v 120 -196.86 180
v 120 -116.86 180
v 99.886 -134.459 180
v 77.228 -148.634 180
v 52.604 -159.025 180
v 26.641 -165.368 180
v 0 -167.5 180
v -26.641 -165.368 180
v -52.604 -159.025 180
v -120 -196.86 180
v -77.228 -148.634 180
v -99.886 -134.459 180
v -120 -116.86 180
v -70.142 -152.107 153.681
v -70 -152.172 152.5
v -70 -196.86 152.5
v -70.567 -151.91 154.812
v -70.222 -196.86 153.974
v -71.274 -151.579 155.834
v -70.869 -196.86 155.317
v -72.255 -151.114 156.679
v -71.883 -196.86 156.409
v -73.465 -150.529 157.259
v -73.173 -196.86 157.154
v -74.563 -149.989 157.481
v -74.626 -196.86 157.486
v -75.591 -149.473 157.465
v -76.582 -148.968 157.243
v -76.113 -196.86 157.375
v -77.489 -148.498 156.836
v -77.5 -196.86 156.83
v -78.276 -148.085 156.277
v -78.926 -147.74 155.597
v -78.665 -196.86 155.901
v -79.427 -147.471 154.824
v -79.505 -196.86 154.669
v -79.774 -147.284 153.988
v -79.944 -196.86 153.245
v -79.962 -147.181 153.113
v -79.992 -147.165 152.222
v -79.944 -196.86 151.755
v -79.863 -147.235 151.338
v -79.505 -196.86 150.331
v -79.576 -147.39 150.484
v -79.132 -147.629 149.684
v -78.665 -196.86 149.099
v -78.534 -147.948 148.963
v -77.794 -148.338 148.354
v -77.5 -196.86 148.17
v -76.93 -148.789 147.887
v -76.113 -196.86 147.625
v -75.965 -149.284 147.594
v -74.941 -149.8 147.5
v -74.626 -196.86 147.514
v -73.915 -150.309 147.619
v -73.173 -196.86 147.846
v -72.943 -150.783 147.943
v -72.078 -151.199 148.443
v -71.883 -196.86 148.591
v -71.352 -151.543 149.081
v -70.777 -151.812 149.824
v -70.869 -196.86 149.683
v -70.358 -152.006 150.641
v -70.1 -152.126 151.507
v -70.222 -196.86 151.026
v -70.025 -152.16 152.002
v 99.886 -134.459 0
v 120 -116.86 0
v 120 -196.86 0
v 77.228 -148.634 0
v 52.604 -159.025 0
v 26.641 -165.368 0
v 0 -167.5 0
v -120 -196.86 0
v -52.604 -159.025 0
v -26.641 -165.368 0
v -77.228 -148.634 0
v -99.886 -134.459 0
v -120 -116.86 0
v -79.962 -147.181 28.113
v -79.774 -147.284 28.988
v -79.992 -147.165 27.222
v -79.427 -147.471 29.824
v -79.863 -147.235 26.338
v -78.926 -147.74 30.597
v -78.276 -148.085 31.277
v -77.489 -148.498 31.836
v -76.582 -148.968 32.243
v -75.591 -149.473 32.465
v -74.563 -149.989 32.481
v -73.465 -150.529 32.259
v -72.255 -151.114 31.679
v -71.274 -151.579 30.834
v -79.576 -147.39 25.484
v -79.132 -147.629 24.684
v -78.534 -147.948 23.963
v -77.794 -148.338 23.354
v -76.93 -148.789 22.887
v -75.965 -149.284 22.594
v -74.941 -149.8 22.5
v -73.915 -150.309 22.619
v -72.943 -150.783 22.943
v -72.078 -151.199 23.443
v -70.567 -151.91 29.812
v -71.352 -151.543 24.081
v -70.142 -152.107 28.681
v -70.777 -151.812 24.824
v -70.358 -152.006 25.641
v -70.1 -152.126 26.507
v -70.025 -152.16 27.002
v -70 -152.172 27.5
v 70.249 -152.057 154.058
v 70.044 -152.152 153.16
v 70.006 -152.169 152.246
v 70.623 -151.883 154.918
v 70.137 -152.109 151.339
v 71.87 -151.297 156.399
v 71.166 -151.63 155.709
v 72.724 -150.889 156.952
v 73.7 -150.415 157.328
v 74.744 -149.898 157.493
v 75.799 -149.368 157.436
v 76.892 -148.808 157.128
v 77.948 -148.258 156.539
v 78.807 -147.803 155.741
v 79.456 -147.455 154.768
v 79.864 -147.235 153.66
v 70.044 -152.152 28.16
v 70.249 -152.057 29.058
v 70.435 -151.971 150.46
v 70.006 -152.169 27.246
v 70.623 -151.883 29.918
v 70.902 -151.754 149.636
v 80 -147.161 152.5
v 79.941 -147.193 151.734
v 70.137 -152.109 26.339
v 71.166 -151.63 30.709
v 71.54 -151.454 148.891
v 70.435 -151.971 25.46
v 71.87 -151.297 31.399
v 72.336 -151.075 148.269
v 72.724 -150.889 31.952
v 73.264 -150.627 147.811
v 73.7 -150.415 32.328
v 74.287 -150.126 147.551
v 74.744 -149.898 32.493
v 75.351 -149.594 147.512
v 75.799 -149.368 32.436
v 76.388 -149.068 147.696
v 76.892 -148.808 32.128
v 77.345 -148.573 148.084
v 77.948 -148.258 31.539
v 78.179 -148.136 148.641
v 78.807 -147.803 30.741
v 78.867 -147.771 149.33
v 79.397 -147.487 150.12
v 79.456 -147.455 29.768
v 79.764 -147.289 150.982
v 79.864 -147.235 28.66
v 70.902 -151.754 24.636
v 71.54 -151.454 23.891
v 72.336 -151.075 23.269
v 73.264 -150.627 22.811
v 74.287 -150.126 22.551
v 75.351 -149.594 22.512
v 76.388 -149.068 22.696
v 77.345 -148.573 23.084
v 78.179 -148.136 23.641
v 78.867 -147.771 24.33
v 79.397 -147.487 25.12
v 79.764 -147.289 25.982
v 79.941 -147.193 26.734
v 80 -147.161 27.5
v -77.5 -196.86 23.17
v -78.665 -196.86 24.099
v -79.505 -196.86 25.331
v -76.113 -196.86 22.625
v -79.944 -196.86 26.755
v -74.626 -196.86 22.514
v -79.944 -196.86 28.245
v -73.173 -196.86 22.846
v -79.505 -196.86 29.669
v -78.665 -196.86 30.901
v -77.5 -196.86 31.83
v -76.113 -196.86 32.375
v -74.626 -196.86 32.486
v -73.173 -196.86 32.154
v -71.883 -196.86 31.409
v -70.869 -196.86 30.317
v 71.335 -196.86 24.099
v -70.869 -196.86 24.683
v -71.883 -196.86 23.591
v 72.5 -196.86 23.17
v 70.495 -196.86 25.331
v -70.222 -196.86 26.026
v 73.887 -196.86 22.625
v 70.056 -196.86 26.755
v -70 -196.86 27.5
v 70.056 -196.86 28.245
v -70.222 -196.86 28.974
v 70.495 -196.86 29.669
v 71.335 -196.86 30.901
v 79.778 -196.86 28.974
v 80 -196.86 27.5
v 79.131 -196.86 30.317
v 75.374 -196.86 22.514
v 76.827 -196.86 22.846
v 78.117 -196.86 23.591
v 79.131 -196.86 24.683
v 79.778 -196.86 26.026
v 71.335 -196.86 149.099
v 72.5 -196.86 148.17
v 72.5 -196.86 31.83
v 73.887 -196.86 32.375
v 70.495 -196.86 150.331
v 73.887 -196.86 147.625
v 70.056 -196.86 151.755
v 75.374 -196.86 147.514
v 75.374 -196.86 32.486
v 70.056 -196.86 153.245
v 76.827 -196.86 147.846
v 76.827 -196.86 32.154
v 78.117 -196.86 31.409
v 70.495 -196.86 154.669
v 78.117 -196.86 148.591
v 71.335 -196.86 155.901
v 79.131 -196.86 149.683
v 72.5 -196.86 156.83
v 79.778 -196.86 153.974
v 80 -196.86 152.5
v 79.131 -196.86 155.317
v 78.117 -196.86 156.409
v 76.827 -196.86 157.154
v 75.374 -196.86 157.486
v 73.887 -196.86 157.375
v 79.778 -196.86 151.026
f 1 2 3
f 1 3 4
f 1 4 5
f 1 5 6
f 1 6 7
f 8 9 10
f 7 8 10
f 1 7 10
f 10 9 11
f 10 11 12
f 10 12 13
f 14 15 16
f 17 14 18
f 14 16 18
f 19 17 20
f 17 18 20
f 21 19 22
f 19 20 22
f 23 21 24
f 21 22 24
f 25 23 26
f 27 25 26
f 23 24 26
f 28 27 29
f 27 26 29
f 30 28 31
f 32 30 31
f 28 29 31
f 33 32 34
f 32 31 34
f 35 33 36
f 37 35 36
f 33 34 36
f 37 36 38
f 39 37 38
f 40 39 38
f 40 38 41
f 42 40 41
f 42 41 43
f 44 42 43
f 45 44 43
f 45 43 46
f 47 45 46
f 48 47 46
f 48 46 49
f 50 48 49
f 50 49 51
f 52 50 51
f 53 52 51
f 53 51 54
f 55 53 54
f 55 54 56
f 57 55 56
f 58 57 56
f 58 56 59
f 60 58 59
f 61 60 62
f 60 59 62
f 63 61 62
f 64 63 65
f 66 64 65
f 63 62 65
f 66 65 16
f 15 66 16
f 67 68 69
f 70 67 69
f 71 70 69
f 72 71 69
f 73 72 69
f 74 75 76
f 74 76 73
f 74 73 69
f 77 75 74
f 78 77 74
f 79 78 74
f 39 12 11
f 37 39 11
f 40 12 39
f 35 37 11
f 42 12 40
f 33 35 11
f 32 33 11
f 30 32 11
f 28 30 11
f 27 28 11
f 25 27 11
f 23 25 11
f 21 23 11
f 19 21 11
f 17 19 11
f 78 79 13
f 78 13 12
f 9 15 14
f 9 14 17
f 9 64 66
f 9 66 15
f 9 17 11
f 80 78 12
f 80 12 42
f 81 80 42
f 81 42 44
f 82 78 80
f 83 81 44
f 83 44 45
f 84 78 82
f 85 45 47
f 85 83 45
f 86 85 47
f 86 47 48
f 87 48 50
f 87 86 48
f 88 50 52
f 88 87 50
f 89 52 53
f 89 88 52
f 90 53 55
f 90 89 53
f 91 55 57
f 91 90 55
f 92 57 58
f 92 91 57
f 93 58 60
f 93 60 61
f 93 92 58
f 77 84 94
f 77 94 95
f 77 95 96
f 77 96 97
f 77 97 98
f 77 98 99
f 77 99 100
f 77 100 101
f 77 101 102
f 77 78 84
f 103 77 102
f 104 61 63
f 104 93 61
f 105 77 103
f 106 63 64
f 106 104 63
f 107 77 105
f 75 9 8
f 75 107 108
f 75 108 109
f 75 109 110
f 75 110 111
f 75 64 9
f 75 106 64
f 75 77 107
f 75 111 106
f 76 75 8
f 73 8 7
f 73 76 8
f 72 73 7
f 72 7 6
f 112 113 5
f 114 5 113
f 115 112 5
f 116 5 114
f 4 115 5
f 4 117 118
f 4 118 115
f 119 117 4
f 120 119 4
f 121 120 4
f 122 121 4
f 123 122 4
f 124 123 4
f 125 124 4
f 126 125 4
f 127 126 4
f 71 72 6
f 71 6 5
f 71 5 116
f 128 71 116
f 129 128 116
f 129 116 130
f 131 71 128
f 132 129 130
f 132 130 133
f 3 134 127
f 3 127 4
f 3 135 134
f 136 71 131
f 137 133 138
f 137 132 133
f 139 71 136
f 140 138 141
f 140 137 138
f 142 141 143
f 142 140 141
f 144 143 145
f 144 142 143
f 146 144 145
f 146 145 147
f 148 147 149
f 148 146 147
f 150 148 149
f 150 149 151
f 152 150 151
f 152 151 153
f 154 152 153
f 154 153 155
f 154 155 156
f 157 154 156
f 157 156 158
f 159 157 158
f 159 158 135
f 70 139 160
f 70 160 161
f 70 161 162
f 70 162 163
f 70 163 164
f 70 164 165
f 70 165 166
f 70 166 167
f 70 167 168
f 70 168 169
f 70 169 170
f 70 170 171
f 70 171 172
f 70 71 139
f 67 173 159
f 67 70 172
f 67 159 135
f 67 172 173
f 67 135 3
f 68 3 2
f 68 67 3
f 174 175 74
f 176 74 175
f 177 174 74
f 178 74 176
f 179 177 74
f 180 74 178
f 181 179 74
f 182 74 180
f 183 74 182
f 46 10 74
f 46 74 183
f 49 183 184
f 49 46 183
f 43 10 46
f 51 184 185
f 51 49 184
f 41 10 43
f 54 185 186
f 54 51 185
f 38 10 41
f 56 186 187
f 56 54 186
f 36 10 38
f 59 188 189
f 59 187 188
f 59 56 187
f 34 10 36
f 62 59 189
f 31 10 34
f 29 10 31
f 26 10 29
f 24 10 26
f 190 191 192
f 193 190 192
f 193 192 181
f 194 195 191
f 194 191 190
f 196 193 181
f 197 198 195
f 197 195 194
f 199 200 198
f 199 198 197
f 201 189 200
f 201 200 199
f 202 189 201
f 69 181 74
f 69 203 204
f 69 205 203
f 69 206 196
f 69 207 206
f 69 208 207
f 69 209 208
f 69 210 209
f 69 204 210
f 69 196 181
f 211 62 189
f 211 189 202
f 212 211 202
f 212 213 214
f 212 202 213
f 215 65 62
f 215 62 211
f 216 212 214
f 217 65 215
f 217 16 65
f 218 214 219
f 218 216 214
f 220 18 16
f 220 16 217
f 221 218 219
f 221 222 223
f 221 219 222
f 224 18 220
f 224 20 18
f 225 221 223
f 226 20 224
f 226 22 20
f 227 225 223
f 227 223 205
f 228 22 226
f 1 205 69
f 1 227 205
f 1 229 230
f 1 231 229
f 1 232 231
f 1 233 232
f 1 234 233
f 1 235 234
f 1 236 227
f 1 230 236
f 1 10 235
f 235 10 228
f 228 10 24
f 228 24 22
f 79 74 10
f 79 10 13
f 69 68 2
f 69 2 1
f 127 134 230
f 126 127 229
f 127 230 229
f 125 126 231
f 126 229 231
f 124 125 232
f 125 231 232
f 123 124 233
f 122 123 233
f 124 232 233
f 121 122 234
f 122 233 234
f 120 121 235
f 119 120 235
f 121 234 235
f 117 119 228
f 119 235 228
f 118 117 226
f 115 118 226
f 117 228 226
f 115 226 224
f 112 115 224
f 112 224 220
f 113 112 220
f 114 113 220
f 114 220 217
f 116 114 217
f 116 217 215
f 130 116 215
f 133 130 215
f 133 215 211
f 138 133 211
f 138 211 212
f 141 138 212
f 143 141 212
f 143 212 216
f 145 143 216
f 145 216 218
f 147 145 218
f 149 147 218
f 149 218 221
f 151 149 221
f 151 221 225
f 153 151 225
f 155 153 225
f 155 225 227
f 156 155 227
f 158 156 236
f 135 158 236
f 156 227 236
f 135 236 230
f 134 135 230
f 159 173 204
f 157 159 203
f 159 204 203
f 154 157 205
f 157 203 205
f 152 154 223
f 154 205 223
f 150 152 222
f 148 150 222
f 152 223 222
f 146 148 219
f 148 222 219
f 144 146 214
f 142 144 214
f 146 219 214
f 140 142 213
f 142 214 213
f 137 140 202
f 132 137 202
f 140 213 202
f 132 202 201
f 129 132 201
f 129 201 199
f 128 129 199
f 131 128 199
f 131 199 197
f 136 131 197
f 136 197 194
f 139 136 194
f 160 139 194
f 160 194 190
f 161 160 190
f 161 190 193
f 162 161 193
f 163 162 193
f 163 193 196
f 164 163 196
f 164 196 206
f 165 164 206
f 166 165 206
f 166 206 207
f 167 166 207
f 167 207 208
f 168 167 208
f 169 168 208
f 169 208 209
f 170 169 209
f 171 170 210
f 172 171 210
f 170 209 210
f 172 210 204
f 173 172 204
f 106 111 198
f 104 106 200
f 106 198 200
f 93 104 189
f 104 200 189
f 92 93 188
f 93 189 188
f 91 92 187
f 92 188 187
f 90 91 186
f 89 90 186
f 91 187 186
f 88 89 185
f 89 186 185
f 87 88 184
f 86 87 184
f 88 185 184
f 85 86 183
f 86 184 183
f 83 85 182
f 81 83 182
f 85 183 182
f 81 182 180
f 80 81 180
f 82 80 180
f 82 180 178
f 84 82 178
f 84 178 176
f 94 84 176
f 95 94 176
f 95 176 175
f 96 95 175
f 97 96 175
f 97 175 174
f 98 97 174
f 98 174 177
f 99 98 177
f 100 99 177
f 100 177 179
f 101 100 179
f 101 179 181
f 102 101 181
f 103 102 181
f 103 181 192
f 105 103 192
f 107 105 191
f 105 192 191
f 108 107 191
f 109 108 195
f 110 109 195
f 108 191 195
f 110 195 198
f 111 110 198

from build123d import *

# Parameters (mm, degrees)
IZIM1_R                     = 167.5
IZIM1_R_2                   = 148
Y_KSEKLIK_EKSTR_ZYON2_DEPTH = 185.3
IZIM9_R                     = 3.4
KES_EKSTR_ZYON1_DEPTH       = 15
IZIM10_W                    = 5
IZIM10_H                    = 16.407796145
Y_KSEKLIK_EKSTR_ZYON3_DEPTH = 180
IZIM13_W                    = 308.627991419
IZIM13_H                    = 53.891387346
KES_EKSTR_ZYON2_DEPTH       = 333
IZIM12_R                    = 5
KES_EKSTR_ZYON3_DEPTH       = 333


with BuildPart() as part:
    # Çizim1 → Yükseklik-Ekstrüzyon2 (new body)
    with BuildSketch(Plane.XY):
        Circle(IZIM1_R)
        Circle(IZIM1_R_2, mode=Mode.SUBTRACT)
    extrude(amount=Y_KSEKLIK_EKSTR_ZYON2_DEPTH)

    # Çizim9 → Kes-Ekstrüzyon1 (cut)
    with BuildSketch(Plane(origin=(0, 0, 0), x_dir=(-1, 0, 0), z_dir=(0, 0, -1))):
        with Locations((107.349895203, -112.5)):
            Circle(IZIM9_R)
        with Locations((-107.349895203, -112.5)):
            Circle(IZIM9_R)
        with Locations((-107.349895203, 112.5)):
            Circle(IZIM9_R)
        with Locations((107.349895203, 112.5)):
            Circle(IZIM9_R)
    kes_ekstr_zyon1 = extrude(amount=-KES_EKSTR_ZYON1_DEPTH, mode=Mode.SUBTRACT)

    # Çizim10 → Döndür1 (revolve)
    with BuildSketch(Plane(origin=(0, 0, 0), x_dir=(0, 0, -1), z_dir=(1, 0, 0)), mode=Mode.PRIVATE) as d_nd_r1_sk:
        with Locations((-32.5, 150.703898073)):
            Rectangle(IZIM10_W, IZIM10_H)
    revolve(d_nd_r1_sk.sketch.rotate(Axis((0, 0, 0), (0, 0, 1)), 90), axis=Axis((0, 0, 0), (0, 0, 1)))

    # Aynalama1: Kes-Ekstrüzyon1 across plane
    add(kes_ekstr_zyon1.mirror(Plane(origin=(0, 0, 92.65), x_dir=(1, 0, 0), z_dir=(0, 0, -1))), mode=Mode.SUBTRACT)


with BuildPart() as body_2:
    # Çizim11 → Yükseklik-Ekstrüzyon3 (new body)
    with BuildSketch(Plane.XY):
        with BuildLine():
            Line((120, -116.859958925), (120, -200))
            Line((120, -200), (-120, -200))
            Line((-120, -200), (-120, -116.859958925))
            ThreePointArc((-120, -116.859958925), (0, -167.5), (120, -116.859958925))
        make_face()
    extrude(amount=Y_KSEKLIK_EKSTR_ZYON3_DEPTH)

    # Çizim13 → Kes-Ekstrüzyon2 (cut)
    with BuildSketch(Plane.XY.offset(180)):
        with Locations((-6.112680509, -223.805652598)):
            Rectangle(IZIM13_W, IZIM13_H)
    extrude(amount=-KES_EKSTR_ZYON2_DEPTH, mode=Mode.SUBTRACT)

    # Çizim12 → Kes-Ekstrüzyon3 (cut)
    with BuildSketch(Plane.XZ.offset(200)):
        with Locations((-75, 152.5)):
            Circle(IZIM12_R)
        with Locations((75, 152.5)):
            Circle(IZIM12_R)
        with Locations((75, 27.5)):
            Circle(IZIM12_R)
        with Locations((-75, 27.5)):
            Circle(IZIM12_R)
    extrude(amount=-KES_EKSTR_ZYON3_DEPTH, mode=Mode.SUBTRACT)


solid = body_2.part
